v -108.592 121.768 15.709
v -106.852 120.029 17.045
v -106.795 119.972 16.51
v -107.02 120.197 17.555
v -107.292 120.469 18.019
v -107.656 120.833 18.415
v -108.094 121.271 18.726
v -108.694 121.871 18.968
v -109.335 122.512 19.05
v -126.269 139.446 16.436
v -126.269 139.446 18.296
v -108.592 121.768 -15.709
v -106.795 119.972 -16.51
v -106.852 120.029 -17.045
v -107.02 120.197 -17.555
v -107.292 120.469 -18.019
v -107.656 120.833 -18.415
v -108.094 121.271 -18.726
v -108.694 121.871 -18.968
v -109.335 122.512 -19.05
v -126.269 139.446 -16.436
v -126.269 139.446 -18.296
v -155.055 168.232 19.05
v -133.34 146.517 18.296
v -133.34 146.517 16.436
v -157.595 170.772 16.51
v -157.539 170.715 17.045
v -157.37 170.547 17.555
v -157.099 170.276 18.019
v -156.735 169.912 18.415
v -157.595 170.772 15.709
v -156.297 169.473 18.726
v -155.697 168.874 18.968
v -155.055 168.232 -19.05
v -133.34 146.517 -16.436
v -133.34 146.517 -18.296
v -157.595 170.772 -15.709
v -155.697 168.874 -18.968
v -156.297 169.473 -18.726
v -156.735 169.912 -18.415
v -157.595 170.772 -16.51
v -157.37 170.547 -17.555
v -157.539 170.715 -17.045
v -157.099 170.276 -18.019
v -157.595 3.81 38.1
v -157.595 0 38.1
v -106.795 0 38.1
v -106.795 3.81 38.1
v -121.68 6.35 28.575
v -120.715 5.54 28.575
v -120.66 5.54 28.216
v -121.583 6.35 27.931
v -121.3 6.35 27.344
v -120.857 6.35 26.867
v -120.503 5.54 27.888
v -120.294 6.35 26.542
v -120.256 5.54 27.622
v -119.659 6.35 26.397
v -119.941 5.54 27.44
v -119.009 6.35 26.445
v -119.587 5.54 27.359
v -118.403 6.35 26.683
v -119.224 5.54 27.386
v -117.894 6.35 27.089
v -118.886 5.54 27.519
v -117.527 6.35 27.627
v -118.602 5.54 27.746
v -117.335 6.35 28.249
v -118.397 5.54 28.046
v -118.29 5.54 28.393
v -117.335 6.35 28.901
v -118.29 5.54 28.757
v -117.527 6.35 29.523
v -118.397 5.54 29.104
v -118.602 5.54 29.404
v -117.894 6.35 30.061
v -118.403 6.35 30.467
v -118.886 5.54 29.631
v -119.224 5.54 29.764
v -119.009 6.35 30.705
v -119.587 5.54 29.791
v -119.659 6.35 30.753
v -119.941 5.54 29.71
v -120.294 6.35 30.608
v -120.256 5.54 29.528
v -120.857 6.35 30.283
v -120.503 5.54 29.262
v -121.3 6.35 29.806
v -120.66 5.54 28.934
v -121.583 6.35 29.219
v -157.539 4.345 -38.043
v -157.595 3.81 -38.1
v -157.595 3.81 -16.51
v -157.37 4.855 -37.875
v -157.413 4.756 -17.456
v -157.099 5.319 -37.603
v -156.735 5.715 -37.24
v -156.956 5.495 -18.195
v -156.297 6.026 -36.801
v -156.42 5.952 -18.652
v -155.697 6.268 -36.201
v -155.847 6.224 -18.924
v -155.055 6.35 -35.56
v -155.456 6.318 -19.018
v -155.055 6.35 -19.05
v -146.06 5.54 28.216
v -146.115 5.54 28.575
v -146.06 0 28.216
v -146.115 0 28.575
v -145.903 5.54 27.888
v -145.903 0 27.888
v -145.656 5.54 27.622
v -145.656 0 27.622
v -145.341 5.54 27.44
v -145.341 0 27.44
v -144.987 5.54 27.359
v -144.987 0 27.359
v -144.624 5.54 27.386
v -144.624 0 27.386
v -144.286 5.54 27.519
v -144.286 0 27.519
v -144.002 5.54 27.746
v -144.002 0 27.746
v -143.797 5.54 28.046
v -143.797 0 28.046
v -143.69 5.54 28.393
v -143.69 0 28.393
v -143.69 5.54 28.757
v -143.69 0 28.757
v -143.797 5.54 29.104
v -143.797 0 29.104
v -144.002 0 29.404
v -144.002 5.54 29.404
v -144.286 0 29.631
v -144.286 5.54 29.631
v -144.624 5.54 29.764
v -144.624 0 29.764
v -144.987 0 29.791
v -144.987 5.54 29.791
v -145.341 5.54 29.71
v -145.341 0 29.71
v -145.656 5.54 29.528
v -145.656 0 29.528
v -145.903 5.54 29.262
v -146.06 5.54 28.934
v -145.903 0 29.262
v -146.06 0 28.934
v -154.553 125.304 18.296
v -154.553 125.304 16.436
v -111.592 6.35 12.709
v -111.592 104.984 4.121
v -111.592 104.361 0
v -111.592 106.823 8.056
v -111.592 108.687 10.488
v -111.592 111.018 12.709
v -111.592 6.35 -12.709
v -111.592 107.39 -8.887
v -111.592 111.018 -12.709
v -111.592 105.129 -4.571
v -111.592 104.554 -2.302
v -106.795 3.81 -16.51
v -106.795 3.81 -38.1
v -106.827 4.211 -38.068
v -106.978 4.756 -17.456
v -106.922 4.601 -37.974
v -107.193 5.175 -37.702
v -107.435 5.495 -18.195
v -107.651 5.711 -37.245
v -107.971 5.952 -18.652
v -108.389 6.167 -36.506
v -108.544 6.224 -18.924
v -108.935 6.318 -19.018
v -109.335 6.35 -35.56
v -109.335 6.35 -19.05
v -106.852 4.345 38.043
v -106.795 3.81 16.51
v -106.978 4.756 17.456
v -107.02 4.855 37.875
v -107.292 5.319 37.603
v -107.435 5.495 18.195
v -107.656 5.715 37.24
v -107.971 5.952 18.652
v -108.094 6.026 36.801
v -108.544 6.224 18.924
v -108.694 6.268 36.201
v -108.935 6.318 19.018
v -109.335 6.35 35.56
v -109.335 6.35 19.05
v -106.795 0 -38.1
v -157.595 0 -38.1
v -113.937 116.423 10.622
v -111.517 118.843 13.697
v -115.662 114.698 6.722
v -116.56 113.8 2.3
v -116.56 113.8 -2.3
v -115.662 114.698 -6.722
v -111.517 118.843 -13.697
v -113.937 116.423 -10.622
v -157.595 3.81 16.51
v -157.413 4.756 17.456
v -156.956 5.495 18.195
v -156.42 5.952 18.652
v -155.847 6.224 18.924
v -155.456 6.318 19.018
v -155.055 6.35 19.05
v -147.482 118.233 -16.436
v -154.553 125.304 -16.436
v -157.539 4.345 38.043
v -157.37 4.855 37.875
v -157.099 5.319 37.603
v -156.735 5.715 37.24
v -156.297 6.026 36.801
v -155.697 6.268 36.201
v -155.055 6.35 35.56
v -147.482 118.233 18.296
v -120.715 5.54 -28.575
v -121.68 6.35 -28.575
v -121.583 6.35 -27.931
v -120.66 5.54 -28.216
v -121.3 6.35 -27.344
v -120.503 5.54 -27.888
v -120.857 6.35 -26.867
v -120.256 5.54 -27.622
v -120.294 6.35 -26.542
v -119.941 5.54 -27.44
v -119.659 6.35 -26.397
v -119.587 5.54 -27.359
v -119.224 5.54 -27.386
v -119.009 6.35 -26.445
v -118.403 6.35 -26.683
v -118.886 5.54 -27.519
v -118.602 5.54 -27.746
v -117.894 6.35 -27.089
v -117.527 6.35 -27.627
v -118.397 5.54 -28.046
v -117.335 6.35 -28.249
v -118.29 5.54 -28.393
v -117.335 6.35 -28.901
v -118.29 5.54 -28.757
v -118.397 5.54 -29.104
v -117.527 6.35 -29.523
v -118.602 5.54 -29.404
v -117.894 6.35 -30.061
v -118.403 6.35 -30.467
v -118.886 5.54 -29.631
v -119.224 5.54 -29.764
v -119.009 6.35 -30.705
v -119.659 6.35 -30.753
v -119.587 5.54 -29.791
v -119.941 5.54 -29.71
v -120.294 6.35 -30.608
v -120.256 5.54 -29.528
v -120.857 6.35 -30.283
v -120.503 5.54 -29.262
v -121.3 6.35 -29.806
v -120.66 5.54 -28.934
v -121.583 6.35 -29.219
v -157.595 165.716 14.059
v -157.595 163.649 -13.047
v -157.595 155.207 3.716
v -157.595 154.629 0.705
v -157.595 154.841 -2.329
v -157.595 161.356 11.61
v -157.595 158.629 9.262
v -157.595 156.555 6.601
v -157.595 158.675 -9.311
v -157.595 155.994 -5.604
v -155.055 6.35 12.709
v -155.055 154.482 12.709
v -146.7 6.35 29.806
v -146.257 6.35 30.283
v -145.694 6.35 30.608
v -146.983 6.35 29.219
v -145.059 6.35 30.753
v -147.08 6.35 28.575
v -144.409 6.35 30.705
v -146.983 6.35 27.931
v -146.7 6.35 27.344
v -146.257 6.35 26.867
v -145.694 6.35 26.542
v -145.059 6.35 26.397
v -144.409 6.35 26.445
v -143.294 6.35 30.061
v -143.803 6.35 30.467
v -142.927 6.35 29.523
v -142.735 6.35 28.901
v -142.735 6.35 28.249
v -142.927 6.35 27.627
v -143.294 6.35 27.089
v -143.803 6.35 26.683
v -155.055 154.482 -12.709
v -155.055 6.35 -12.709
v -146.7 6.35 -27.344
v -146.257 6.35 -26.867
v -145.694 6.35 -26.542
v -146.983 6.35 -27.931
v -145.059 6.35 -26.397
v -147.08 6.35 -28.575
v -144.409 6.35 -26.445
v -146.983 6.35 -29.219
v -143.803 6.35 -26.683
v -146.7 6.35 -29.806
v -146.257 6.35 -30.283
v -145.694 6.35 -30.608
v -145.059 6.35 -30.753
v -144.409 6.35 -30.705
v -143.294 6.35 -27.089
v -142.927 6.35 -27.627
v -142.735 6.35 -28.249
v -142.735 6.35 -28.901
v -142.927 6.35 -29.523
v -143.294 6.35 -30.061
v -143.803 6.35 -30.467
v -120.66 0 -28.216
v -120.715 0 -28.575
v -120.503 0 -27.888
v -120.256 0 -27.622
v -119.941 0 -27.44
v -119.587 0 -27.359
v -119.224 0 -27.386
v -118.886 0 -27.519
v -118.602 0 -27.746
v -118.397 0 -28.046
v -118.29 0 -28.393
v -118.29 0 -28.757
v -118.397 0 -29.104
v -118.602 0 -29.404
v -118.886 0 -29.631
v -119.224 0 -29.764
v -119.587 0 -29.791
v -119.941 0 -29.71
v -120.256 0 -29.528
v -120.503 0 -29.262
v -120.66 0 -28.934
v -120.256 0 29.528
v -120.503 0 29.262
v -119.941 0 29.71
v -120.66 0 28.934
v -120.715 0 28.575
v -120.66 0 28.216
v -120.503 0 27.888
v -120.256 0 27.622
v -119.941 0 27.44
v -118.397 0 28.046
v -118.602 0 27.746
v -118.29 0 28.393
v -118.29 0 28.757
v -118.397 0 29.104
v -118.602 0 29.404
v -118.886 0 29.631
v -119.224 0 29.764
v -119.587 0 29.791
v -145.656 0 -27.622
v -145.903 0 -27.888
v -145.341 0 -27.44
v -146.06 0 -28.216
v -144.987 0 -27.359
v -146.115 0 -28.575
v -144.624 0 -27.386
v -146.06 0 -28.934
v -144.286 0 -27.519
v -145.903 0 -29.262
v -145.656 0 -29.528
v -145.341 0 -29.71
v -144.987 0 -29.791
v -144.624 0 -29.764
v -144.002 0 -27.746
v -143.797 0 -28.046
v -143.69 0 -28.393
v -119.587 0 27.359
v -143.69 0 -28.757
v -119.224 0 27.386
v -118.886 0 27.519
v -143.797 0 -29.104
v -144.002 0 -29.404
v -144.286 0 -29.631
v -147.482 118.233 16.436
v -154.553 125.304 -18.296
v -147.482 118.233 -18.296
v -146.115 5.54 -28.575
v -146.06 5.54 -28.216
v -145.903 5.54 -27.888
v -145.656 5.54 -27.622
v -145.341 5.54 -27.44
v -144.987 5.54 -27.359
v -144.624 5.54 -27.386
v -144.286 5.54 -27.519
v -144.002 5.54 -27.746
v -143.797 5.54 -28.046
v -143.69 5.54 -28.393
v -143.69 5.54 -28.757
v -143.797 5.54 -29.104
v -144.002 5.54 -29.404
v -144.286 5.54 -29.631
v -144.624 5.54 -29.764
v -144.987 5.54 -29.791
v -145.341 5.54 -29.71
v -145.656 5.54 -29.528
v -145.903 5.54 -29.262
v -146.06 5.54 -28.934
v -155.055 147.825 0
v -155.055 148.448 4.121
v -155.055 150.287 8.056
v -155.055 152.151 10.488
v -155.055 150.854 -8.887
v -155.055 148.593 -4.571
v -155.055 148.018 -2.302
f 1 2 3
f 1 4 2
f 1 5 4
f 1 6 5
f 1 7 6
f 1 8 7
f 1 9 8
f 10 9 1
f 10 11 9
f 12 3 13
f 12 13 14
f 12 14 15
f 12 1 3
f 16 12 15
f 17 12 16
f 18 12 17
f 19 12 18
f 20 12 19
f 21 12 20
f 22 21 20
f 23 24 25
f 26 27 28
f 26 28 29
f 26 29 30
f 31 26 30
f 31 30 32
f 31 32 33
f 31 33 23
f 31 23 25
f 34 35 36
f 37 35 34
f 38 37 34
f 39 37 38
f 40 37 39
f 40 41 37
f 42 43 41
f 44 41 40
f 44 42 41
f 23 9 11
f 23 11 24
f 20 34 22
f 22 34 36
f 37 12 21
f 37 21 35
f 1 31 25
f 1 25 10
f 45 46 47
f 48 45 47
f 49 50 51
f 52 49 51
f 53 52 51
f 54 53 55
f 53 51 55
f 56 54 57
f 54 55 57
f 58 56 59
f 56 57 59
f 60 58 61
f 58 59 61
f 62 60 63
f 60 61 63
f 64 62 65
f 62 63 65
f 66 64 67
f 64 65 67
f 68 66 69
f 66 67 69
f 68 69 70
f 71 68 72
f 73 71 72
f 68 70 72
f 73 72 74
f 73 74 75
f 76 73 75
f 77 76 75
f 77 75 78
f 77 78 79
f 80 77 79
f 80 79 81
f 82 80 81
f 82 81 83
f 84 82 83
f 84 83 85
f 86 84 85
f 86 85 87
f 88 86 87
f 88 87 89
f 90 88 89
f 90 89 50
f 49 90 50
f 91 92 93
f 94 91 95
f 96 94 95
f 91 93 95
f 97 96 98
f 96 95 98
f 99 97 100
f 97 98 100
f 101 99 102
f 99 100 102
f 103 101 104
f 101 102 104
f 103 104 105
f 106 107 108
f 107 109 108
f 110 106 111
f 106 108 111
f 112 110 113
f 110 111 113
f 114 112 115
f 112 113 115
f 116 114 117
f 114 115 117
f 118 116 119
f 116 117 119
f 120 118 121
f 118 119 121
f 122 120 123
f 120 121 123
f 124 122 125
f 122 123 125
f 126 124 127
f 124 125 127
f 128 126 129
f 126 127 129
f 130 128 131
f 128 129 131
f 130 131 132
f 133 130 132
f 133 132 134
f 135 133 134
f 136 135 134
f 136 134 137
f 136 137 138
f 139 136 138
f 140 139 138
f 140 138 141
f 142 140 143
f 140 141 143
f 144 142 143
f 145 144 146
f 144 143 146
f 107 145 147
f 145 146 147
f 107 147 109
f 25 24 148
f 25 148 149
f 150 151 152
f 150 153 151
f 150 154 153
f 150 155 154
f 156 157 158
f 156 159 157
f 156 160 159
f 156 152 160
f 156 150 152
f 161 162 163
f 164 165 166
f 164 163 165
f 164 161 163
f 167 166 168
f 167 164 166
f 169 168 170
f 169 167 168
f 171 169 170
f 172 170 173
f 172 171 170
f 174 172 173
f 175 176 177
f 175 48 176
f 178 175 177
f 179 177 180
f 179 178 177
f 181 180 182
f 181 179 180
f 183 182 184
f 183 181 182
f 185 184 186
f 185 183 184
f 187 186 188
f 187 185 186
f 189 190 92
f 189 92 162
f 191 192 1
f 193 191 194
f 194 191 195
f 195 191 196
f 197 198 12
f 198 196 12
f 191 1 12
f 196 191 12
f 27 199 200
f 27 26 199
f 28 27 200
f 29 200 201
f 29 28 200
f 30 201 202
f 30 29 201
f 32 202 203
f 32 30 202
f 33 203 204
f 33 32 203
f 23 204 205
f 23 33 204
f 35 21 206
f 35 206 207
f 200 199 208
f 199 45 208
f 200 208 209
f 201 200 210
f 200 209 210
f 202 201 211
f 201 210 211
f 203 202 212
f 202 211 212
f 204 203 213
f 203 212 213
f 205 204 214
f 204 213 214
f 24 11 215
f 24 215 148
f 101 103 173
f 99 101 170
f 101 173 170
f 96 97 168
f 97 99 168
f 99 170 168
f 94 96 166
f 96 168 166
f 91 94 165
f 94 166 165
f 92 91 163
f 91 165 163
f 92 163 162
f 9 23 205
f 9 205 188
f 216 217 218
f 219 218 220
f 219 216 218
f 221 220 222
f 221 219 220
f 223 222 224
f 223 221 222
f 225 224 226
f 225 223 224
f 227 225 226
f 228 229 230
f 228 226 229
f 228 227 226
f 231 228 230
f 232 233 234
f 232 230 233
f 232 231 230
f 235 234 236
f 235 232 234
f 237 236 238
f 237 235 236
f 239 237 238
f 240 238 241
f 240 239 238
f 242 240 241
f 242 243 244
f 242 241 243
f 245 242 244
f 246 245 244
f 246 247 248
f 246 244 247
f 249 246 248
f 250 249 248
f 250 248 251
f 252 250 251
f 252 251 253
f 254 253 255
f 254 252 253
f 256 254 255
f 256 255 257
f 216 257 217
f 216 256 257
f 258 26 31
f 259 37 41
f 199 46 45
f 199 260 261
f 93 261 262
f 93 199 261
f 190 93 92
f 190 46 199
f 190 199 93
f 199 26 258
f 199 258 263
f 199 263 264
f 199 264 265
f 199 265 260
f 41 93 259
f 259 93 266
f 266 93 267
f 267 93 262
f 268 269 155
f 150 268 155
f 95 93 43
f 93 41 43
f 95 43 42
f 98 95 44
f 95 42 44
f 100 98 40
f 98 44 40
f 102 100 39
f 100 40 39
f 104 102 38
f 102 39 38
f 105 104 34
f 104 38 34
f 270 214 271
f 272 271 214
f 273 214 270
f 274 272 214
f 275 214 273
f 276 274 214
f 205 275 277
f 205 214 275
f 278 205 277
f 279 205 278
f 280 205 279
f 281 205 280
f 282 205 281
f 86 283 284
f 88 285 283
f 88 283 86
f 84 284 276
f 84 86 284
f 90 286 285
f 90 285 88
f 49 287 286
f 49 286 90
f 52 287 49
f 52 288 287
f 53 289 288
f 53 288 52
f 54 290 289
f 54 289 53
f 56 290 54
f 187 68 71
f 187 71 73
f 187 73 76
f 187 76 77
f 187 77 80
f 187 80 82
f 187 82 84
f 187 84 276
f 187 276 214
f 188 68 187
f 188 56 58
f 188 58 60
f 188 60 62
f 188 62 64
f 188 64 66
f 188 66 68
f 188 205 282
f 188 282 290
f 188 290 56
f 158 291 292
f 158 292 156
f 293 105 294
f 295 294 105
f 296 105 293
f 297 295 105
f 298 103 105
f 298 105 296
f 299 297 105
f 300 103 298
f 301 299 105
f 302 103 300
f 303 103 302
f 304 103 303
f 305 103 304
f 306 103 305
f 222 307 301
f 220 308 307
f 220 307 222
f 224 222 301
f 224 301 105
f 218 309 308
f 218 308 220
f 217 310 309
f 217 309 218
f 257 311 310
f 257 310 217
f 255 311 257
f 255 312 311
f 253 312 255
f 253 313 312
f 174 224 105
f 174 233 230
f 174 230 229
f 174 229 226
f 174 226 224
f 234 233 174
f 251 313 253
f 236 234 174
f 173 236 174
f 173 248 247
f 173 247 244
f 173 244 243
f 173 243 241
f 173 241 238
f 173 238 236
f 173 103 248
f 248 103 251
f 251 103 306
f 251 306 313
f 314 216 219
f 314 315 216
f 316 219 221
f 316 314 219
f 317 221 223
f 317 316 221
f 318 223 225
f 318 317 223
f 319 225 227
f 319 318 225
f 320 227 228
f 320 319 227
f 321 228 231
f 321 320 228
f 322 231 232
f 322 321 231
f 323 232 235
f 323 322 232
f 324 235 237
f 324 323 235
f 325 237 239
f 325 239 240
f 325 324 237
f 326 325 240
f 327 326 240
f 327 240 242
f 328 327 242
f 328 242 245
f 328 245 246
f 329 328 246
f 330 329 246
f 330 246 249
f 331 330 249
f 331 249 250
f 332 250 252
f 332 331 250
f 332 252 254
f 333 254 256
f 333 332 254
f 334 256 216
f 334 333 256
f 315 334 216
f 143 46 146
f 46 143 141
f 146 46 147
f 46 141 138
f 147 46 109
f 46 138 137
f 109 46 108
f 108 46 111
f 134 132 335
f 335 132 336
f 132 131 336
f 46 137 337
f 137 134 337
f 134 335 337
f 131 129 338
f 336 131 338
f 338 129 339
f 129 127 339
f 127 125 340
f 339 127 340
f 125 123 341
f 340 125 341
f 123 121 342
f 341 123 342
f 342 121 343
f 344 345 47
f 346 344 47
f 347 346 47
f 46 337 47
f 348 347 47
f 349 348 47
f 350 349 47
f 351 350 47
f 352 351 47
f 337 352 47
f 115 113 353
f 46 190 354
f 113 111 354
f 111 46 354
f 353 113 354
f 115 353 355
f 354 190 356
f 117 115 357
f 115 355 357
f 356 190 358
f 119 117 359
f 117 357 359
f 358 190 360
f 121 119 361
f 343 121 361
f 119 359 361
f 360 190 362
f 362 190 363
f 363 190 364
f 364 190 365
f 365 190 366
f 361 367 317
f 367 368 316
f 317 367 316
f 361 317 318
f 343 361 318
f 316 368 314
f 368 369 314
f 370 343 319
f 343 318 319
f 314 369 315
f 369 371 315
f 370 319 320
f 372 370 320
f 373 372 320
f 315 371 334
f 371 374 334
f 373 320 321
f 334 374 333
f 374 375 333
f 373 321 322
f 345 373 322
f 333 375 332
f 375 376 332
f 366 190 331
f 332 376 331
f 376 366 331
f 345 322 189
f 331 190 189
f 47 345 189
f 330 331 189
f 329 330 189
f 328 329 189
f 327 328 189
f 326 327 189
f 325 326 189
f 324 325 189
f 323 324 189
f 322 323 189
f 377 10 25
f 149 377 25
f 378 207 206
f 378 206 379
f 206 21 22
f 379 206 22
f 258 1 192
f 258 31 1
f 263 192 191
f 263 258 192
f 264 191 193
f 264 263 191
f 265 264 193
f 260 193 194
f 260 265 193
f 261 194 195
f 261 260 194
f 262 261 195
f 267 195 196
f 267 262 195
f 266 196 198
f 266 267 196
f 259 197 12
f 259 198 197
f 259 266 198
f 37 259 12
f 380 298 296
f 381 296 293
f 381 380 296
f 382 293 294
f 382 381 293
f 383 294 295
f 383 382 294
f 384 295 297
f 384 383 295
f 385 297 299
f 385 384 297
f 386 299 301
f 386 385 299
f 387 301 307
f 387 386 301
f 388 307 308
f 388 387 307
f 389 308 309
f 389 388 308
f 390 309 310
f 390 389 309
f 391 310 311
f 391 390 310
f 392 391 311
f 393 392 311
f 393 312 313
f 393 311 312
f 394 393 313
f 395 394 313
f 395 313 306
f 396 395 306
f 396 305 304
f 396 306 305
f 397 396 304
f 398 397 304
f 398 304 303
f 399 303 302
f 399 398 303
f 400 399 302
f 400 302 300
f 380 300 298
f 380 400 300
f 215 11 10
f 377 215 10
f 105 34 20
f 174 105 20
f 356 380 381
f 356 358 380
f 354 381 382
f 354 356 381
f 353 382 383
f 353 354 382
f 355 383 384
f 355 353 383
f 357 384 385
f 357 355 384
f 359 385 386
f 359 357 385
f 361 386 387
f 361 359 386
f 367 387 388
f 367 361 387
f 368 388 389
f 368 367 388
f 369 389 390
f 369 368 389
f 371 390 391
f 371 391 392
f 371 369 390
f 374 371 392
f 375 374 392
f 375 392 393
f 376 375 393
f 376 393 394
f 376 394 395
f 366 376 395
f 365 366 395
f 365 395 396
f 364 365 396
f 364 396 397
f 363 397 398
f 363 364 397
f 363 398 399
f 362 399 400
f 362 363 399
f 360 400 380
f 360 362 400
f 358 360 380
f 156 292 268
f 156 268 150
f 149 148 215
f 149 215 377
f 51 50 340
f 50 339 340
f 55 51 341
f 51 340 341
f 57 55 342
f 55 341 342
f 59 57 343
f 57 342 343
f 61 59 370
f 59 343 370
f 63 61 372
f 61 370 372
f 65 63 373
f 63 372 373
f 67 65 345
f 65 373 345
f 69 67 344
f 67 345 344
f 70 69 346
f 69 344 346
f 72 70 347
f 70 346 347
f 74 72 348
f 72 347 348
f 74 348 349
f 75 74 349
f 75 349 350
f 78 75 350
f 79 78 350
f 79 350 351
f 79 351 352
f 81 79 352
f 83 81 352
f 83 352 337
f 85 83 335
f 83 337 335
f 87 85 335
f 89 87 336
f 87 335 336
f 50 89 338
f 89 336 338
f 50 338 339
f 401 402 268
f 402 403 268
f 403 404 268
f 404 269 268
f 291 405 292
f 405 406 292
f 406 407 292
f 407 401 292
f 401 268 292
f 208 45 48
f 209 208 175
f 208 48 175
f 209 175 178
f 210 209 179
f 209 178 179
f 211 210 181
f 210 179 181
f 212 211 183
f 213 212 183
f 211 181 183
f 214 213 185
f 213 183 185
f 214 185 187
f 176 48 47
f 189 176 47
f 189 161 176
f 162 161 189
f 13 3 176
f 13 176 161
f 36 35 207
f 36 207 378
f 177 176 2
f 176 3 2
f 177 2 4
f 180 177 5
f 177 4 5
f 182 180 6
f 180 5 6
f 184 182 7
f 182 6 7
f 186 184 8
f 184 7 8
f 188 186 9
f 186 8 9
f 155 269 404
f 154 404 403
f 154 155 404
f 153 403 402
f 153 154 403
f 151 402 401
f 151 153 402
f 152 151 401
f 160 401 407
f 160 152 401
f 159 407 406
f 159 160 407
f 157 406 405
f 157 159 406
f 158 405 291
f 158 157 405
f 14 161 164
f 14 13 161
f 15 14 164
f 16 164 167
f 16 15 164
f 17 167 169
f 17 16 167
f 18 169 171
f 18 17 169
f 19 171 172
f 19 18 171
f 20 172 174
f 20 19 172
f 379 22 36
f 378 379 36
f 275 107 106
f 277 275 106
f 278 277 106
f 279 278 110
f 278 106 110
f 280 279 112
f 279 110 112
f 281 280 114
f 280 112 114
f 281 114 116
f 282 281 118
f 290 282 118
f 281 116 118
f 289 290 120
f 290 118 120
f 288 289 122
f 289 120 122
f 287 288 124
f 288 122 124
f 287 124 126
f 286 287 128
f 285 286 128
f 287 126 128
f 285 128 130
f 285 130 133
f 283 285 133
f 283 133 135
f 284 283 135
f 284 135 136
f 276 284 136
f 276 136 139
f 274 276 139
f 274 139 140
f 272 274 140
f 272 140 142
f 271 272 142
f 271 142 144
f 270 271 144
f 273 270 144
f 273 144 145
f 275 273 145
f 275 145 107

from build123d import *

# Parameters (mm, degrees)
SKETCH1_W                                         = 50.8
SKETCH1_H                                         = 76.2
BOSS_EXTRUDE1_DEPTH                               = 6.35
SKETCH2_W                                         = 50.8
SKETCH2_H                                         = 38.1
BOSS_EXTRUDE2_DEPTH                               = 171.6066
CUT_EXTRUDE1_DEPTH                                = 183.535025619
CUT_EXTRUDE1_DEPTH_BACK                           = 183.535025619
BOSS_EXTRUDE3_REACH                               = 237.296
SKETCH20_W                                        = 38.1
SKETCH20_H                                        = 2.54
BOSS_EXTRUDE4_REACH                               = 129.523
CSK_FOR_2_FLAT_HEAD_MACHINE_SCREW_100_D           = 2.4384
CSK_FOR_2_FLAT_HEAD_MACHINE_SCREW_100_CSINK_D     = 4.3688
CSK_FOR_2_FLAT_HEAD_MACHINE_SCREW_100_CSINK_ANGLE = 100
FILLET1_R                                         = 2.54
FILLET2_R                                         = 2.54
SKETCH29_W                                        = 1.860730234
SKETCH29_H                                        = 10
CUT_EXTRUDE2_DEPTH                                = 30
CUT_EXTRUDE3_REACH                                = 232.917
CUT_EXTRUDE3_END_RADIUS                           = 19.51
SKETCH30_W                                        = 43.463948775
SKETCH30_H                                        = 25.418064868


with BuildPart() as part:
    # Sketch1 → Boss-Extrude1 (new body)
    with BuildSketch(Plane(origin=(0, 0, 0), x_dir=(1, 0, 0), z_dir=(0, 1, 0))):
        with Locations((-132.195454545, 0)):
            Rectangle(SKETCH1_W, SKETCH1_H)
    extrude(amount=BOSS_EXTRUDE1_DEPTH)

    # Sketch2 → Boss-Extrude2 (add)
    with BuildSketch(Plane(origin=(0, 6.35, 0), x_dir=(1, 0, 0), z_dir=(0, 1, 0))):
        with Locations((-132.195454545, 0)):
            Rectangle(SKETCH2_W, SKETCH2_H)
    extrude(amount=BOSS_EXTRUDE2_DEPTH)

    # Sketch19 → Cut-Extrude1 (cut, two sides: drawn at the far end of the back side and taken through both)
    with BuildSketch(Plane(origin=(-167.776027273, 167.776027273, 0), x_dir=(-0.7071067811865488, -0.7071067811865462, 0), z_dir=(0.7071067811865462, -0.7071067811865488, 0)).offset(-CUT_EXTRUDE1_DEPTH_BACK)):
        with BuildLine():
            Line((-14.397504024, 16.51), (-14.397504024, -16.51))
            ThreePointArc((-14.397504024, -16.51), (2.112495976, 0), (-14.397504024, 16.51))
        make_face()
    extrude(amount=CUT_EXTRUDE1_DEPTH + CUT_EXTRUDE1_DEPTH_BACK, mode=Mode.SUBTRACT)

    # SurfaceCut1
    split(bisect_by=Plane(origin=(6.588470279, 6.588470279, 0), x_dir=(0, 0, 1), z_dir=(-0.7071067811865488, -0.7071067811865464, 0)), keep=Keep.TOP)

    # Sketch20 → Boss-Extrude3 (add, up to next)
    with BuildSketch(Plane(origin=(6.588470279, 6.588470279, 0), x_dir=(0, 0, -1), z_dir=(0.7071067811865487, 0.7071067811865465, 0)), mode=Mode.PRIVATE) as boss_extrude3_sk1:
        with Locations((0, 161.619084242)):
            Rectangle(SKETCH20_W, SKETCH20_H)
    boss_extrude3_tool1 = extrude(boss_extrude3_sk1.sketch, amount=-BOSS_EXTRUDE3_REACH, mode=Mode.PRIVATE) - part.part
    add(boss_extrude3_tool1.solids().sort_by_distance((-107.69348, 120.870421, 0))[0])

    # Boss-Extrude4: up to this face of the body (flat: up to its plane)
    boss_extrude4_end = Plane(part.part.faces().sort_by_distance((-106.795454545, 52.426789341, 0))[0])
    # Sketch22 → Boss-Extrude4 (add, up to the picked face)
    with BuildSketch(Plane(origin=(-113.383924824, 113.383924824, 0), x_dir=(0, 0, -1), z_dir=(0.7071067811865465, -0.7071067811865486, 0)), mode=Mode.PRIVATE) as boss_extrude4_sk1:
        with BuildLine():
            Line((-15.709032434, 9.317504024), (15.709032434, 9.317504024))
            ThreePointArc((15.709032434, 9.317504024), (0, -6.39152841), (-15.709032434, 9.317504024))
        make_face()
    boss_extrude4_tool1 = split(extrude(boss_extrude4_sk1.sketch, amount=BOSS_EXTRUDE4_REACH, mode=Mode.PRIVATE), bisect_by=boss_extrude4_end, keep=Keep.BOTH, mode=Mode.PRIVATE)
    add(boss_extrude4_tool1.solids().sort_by(Axis((-111.509821, 115.258029, 0), (0.7071067811865465, -0.7071067811865486, 0)))[0])

    # CSK for #2 Flat Head Machine Screw (100)1 (through all)
    with Locations(Plane(origin=(0, 6.35, 0), x_dir=(1, 0, 0), z_dir=(0, 1, 0))):
        with Locations((-144.895454545, -28.575), (-119.495454545, -28.575)):
            csk_for_2_flat_head_machine_screw_100 = CounterSinkHole(CSK_FOR_2_FLAT_HEAD_MACHINE_SCREW_100_D / 2, CSK_FOR_2_FLAT_HEAD_MACHINE_SCREW_100_CSINK_D / 2, counter_sink_angle=CSK_FOR_2_FLAT_HEAD_MACHINE_SCREW_100_CSINK_ANGLE)

    # Mirror1: CSK for #2 Flat Head Machine Screw (100)1 across plane
    add(csk_for_2_flat_head_machine_screw_100.mirror(Plane.XY), mode=Mode.SUBTRACT)

    # Fillet1
    fillet1_edges = [part.edges().sort_by_distance(p)[0] for p in [
        (-157.595454545, 88.561197552, 19.05),
        (-106.795454545, 63.161197552, 19.05),
        (-106.795454545, 63.161197552, -19.05),
        (-157.595454545, 88.561197552, -19.05),
    ]]
    fillet(fillet1_edges, radius=FILLET1_R)

    # Fillet2
    fillet2_edges = [part.edges().sort_by_distance(p)[0] for p in [
        (-157.595454545, 6.35, -27.305),
        (-132.195454545, 6.35, -38.1),
        (-106.795454545, 6.35, -27.305),
        (-157.595454545, 6.35, 27.305),
        (-132.195454545, 6.35, 38.1),
        (-106.795454545, 6.35, 27.305),
    ]]
    fillet(fillet2_edges, radius=FILLET2_R)

    # Sketch29 → Cut-Extrude2 (cut)
    with BuildSketch(Plane(origin=(6.588470279, 6.588470279, 0), x_dir=(0, 0, -1), z_dir=(0.7071067811865487, 0.7071067811865465, 0))):
        with Locations((17.36598973, 192.889084242)):
            Rectangle(SKETCH29_W, SKETCH29_H)
        with Locations((-17.36598973, 192.889084242)):
            Rectangle(SKETCH29_W, SKETCH29_H)
    extrude(amount=-CUT_EXTRUDE2_DEPTH, mode=Mode.SUBTRACT)

    # Cut-Extrude3: up to this cylinder (the profile starts outside it)
    cut_extrude3_end = Plane(origin=(-59.656167273, 80.017312727, 0), z_dir=(0.7071067811865462, -0.7071067811865488, 0)) * Cylinder(CUT_EXTRUDE3_END_RADIUS, 505.854, mode=Mode.PRIVATE)
    # Sketch30 → Cut-Extrude3 (cut, up to the surface)
    with BuildSketch(Plane(origin=(0, 6.35, 0), x_dir=(1, 0, 0), z_dir=(0, 1, 0)), mode=Mode.PRIVATE) as cut_extrude3_sk1:
        with Locations((-133.323480158, 0)):
            Rectangle(SKETCH30_W, SKETCH30_H)
    cut_extrude3_tool1 = extrude(cut_extrude3_sk1.sketch, amount=CUT_EXTRUDE3_REACH, mode=Mode.PRIVATE) - cut_extrude3_end
    add(cut_extrude3_tool1.solids().sort_by_distance((-133.32348, 6.35, 0))[0], mode=Mode.SUBTRACT)


solid = part.part
